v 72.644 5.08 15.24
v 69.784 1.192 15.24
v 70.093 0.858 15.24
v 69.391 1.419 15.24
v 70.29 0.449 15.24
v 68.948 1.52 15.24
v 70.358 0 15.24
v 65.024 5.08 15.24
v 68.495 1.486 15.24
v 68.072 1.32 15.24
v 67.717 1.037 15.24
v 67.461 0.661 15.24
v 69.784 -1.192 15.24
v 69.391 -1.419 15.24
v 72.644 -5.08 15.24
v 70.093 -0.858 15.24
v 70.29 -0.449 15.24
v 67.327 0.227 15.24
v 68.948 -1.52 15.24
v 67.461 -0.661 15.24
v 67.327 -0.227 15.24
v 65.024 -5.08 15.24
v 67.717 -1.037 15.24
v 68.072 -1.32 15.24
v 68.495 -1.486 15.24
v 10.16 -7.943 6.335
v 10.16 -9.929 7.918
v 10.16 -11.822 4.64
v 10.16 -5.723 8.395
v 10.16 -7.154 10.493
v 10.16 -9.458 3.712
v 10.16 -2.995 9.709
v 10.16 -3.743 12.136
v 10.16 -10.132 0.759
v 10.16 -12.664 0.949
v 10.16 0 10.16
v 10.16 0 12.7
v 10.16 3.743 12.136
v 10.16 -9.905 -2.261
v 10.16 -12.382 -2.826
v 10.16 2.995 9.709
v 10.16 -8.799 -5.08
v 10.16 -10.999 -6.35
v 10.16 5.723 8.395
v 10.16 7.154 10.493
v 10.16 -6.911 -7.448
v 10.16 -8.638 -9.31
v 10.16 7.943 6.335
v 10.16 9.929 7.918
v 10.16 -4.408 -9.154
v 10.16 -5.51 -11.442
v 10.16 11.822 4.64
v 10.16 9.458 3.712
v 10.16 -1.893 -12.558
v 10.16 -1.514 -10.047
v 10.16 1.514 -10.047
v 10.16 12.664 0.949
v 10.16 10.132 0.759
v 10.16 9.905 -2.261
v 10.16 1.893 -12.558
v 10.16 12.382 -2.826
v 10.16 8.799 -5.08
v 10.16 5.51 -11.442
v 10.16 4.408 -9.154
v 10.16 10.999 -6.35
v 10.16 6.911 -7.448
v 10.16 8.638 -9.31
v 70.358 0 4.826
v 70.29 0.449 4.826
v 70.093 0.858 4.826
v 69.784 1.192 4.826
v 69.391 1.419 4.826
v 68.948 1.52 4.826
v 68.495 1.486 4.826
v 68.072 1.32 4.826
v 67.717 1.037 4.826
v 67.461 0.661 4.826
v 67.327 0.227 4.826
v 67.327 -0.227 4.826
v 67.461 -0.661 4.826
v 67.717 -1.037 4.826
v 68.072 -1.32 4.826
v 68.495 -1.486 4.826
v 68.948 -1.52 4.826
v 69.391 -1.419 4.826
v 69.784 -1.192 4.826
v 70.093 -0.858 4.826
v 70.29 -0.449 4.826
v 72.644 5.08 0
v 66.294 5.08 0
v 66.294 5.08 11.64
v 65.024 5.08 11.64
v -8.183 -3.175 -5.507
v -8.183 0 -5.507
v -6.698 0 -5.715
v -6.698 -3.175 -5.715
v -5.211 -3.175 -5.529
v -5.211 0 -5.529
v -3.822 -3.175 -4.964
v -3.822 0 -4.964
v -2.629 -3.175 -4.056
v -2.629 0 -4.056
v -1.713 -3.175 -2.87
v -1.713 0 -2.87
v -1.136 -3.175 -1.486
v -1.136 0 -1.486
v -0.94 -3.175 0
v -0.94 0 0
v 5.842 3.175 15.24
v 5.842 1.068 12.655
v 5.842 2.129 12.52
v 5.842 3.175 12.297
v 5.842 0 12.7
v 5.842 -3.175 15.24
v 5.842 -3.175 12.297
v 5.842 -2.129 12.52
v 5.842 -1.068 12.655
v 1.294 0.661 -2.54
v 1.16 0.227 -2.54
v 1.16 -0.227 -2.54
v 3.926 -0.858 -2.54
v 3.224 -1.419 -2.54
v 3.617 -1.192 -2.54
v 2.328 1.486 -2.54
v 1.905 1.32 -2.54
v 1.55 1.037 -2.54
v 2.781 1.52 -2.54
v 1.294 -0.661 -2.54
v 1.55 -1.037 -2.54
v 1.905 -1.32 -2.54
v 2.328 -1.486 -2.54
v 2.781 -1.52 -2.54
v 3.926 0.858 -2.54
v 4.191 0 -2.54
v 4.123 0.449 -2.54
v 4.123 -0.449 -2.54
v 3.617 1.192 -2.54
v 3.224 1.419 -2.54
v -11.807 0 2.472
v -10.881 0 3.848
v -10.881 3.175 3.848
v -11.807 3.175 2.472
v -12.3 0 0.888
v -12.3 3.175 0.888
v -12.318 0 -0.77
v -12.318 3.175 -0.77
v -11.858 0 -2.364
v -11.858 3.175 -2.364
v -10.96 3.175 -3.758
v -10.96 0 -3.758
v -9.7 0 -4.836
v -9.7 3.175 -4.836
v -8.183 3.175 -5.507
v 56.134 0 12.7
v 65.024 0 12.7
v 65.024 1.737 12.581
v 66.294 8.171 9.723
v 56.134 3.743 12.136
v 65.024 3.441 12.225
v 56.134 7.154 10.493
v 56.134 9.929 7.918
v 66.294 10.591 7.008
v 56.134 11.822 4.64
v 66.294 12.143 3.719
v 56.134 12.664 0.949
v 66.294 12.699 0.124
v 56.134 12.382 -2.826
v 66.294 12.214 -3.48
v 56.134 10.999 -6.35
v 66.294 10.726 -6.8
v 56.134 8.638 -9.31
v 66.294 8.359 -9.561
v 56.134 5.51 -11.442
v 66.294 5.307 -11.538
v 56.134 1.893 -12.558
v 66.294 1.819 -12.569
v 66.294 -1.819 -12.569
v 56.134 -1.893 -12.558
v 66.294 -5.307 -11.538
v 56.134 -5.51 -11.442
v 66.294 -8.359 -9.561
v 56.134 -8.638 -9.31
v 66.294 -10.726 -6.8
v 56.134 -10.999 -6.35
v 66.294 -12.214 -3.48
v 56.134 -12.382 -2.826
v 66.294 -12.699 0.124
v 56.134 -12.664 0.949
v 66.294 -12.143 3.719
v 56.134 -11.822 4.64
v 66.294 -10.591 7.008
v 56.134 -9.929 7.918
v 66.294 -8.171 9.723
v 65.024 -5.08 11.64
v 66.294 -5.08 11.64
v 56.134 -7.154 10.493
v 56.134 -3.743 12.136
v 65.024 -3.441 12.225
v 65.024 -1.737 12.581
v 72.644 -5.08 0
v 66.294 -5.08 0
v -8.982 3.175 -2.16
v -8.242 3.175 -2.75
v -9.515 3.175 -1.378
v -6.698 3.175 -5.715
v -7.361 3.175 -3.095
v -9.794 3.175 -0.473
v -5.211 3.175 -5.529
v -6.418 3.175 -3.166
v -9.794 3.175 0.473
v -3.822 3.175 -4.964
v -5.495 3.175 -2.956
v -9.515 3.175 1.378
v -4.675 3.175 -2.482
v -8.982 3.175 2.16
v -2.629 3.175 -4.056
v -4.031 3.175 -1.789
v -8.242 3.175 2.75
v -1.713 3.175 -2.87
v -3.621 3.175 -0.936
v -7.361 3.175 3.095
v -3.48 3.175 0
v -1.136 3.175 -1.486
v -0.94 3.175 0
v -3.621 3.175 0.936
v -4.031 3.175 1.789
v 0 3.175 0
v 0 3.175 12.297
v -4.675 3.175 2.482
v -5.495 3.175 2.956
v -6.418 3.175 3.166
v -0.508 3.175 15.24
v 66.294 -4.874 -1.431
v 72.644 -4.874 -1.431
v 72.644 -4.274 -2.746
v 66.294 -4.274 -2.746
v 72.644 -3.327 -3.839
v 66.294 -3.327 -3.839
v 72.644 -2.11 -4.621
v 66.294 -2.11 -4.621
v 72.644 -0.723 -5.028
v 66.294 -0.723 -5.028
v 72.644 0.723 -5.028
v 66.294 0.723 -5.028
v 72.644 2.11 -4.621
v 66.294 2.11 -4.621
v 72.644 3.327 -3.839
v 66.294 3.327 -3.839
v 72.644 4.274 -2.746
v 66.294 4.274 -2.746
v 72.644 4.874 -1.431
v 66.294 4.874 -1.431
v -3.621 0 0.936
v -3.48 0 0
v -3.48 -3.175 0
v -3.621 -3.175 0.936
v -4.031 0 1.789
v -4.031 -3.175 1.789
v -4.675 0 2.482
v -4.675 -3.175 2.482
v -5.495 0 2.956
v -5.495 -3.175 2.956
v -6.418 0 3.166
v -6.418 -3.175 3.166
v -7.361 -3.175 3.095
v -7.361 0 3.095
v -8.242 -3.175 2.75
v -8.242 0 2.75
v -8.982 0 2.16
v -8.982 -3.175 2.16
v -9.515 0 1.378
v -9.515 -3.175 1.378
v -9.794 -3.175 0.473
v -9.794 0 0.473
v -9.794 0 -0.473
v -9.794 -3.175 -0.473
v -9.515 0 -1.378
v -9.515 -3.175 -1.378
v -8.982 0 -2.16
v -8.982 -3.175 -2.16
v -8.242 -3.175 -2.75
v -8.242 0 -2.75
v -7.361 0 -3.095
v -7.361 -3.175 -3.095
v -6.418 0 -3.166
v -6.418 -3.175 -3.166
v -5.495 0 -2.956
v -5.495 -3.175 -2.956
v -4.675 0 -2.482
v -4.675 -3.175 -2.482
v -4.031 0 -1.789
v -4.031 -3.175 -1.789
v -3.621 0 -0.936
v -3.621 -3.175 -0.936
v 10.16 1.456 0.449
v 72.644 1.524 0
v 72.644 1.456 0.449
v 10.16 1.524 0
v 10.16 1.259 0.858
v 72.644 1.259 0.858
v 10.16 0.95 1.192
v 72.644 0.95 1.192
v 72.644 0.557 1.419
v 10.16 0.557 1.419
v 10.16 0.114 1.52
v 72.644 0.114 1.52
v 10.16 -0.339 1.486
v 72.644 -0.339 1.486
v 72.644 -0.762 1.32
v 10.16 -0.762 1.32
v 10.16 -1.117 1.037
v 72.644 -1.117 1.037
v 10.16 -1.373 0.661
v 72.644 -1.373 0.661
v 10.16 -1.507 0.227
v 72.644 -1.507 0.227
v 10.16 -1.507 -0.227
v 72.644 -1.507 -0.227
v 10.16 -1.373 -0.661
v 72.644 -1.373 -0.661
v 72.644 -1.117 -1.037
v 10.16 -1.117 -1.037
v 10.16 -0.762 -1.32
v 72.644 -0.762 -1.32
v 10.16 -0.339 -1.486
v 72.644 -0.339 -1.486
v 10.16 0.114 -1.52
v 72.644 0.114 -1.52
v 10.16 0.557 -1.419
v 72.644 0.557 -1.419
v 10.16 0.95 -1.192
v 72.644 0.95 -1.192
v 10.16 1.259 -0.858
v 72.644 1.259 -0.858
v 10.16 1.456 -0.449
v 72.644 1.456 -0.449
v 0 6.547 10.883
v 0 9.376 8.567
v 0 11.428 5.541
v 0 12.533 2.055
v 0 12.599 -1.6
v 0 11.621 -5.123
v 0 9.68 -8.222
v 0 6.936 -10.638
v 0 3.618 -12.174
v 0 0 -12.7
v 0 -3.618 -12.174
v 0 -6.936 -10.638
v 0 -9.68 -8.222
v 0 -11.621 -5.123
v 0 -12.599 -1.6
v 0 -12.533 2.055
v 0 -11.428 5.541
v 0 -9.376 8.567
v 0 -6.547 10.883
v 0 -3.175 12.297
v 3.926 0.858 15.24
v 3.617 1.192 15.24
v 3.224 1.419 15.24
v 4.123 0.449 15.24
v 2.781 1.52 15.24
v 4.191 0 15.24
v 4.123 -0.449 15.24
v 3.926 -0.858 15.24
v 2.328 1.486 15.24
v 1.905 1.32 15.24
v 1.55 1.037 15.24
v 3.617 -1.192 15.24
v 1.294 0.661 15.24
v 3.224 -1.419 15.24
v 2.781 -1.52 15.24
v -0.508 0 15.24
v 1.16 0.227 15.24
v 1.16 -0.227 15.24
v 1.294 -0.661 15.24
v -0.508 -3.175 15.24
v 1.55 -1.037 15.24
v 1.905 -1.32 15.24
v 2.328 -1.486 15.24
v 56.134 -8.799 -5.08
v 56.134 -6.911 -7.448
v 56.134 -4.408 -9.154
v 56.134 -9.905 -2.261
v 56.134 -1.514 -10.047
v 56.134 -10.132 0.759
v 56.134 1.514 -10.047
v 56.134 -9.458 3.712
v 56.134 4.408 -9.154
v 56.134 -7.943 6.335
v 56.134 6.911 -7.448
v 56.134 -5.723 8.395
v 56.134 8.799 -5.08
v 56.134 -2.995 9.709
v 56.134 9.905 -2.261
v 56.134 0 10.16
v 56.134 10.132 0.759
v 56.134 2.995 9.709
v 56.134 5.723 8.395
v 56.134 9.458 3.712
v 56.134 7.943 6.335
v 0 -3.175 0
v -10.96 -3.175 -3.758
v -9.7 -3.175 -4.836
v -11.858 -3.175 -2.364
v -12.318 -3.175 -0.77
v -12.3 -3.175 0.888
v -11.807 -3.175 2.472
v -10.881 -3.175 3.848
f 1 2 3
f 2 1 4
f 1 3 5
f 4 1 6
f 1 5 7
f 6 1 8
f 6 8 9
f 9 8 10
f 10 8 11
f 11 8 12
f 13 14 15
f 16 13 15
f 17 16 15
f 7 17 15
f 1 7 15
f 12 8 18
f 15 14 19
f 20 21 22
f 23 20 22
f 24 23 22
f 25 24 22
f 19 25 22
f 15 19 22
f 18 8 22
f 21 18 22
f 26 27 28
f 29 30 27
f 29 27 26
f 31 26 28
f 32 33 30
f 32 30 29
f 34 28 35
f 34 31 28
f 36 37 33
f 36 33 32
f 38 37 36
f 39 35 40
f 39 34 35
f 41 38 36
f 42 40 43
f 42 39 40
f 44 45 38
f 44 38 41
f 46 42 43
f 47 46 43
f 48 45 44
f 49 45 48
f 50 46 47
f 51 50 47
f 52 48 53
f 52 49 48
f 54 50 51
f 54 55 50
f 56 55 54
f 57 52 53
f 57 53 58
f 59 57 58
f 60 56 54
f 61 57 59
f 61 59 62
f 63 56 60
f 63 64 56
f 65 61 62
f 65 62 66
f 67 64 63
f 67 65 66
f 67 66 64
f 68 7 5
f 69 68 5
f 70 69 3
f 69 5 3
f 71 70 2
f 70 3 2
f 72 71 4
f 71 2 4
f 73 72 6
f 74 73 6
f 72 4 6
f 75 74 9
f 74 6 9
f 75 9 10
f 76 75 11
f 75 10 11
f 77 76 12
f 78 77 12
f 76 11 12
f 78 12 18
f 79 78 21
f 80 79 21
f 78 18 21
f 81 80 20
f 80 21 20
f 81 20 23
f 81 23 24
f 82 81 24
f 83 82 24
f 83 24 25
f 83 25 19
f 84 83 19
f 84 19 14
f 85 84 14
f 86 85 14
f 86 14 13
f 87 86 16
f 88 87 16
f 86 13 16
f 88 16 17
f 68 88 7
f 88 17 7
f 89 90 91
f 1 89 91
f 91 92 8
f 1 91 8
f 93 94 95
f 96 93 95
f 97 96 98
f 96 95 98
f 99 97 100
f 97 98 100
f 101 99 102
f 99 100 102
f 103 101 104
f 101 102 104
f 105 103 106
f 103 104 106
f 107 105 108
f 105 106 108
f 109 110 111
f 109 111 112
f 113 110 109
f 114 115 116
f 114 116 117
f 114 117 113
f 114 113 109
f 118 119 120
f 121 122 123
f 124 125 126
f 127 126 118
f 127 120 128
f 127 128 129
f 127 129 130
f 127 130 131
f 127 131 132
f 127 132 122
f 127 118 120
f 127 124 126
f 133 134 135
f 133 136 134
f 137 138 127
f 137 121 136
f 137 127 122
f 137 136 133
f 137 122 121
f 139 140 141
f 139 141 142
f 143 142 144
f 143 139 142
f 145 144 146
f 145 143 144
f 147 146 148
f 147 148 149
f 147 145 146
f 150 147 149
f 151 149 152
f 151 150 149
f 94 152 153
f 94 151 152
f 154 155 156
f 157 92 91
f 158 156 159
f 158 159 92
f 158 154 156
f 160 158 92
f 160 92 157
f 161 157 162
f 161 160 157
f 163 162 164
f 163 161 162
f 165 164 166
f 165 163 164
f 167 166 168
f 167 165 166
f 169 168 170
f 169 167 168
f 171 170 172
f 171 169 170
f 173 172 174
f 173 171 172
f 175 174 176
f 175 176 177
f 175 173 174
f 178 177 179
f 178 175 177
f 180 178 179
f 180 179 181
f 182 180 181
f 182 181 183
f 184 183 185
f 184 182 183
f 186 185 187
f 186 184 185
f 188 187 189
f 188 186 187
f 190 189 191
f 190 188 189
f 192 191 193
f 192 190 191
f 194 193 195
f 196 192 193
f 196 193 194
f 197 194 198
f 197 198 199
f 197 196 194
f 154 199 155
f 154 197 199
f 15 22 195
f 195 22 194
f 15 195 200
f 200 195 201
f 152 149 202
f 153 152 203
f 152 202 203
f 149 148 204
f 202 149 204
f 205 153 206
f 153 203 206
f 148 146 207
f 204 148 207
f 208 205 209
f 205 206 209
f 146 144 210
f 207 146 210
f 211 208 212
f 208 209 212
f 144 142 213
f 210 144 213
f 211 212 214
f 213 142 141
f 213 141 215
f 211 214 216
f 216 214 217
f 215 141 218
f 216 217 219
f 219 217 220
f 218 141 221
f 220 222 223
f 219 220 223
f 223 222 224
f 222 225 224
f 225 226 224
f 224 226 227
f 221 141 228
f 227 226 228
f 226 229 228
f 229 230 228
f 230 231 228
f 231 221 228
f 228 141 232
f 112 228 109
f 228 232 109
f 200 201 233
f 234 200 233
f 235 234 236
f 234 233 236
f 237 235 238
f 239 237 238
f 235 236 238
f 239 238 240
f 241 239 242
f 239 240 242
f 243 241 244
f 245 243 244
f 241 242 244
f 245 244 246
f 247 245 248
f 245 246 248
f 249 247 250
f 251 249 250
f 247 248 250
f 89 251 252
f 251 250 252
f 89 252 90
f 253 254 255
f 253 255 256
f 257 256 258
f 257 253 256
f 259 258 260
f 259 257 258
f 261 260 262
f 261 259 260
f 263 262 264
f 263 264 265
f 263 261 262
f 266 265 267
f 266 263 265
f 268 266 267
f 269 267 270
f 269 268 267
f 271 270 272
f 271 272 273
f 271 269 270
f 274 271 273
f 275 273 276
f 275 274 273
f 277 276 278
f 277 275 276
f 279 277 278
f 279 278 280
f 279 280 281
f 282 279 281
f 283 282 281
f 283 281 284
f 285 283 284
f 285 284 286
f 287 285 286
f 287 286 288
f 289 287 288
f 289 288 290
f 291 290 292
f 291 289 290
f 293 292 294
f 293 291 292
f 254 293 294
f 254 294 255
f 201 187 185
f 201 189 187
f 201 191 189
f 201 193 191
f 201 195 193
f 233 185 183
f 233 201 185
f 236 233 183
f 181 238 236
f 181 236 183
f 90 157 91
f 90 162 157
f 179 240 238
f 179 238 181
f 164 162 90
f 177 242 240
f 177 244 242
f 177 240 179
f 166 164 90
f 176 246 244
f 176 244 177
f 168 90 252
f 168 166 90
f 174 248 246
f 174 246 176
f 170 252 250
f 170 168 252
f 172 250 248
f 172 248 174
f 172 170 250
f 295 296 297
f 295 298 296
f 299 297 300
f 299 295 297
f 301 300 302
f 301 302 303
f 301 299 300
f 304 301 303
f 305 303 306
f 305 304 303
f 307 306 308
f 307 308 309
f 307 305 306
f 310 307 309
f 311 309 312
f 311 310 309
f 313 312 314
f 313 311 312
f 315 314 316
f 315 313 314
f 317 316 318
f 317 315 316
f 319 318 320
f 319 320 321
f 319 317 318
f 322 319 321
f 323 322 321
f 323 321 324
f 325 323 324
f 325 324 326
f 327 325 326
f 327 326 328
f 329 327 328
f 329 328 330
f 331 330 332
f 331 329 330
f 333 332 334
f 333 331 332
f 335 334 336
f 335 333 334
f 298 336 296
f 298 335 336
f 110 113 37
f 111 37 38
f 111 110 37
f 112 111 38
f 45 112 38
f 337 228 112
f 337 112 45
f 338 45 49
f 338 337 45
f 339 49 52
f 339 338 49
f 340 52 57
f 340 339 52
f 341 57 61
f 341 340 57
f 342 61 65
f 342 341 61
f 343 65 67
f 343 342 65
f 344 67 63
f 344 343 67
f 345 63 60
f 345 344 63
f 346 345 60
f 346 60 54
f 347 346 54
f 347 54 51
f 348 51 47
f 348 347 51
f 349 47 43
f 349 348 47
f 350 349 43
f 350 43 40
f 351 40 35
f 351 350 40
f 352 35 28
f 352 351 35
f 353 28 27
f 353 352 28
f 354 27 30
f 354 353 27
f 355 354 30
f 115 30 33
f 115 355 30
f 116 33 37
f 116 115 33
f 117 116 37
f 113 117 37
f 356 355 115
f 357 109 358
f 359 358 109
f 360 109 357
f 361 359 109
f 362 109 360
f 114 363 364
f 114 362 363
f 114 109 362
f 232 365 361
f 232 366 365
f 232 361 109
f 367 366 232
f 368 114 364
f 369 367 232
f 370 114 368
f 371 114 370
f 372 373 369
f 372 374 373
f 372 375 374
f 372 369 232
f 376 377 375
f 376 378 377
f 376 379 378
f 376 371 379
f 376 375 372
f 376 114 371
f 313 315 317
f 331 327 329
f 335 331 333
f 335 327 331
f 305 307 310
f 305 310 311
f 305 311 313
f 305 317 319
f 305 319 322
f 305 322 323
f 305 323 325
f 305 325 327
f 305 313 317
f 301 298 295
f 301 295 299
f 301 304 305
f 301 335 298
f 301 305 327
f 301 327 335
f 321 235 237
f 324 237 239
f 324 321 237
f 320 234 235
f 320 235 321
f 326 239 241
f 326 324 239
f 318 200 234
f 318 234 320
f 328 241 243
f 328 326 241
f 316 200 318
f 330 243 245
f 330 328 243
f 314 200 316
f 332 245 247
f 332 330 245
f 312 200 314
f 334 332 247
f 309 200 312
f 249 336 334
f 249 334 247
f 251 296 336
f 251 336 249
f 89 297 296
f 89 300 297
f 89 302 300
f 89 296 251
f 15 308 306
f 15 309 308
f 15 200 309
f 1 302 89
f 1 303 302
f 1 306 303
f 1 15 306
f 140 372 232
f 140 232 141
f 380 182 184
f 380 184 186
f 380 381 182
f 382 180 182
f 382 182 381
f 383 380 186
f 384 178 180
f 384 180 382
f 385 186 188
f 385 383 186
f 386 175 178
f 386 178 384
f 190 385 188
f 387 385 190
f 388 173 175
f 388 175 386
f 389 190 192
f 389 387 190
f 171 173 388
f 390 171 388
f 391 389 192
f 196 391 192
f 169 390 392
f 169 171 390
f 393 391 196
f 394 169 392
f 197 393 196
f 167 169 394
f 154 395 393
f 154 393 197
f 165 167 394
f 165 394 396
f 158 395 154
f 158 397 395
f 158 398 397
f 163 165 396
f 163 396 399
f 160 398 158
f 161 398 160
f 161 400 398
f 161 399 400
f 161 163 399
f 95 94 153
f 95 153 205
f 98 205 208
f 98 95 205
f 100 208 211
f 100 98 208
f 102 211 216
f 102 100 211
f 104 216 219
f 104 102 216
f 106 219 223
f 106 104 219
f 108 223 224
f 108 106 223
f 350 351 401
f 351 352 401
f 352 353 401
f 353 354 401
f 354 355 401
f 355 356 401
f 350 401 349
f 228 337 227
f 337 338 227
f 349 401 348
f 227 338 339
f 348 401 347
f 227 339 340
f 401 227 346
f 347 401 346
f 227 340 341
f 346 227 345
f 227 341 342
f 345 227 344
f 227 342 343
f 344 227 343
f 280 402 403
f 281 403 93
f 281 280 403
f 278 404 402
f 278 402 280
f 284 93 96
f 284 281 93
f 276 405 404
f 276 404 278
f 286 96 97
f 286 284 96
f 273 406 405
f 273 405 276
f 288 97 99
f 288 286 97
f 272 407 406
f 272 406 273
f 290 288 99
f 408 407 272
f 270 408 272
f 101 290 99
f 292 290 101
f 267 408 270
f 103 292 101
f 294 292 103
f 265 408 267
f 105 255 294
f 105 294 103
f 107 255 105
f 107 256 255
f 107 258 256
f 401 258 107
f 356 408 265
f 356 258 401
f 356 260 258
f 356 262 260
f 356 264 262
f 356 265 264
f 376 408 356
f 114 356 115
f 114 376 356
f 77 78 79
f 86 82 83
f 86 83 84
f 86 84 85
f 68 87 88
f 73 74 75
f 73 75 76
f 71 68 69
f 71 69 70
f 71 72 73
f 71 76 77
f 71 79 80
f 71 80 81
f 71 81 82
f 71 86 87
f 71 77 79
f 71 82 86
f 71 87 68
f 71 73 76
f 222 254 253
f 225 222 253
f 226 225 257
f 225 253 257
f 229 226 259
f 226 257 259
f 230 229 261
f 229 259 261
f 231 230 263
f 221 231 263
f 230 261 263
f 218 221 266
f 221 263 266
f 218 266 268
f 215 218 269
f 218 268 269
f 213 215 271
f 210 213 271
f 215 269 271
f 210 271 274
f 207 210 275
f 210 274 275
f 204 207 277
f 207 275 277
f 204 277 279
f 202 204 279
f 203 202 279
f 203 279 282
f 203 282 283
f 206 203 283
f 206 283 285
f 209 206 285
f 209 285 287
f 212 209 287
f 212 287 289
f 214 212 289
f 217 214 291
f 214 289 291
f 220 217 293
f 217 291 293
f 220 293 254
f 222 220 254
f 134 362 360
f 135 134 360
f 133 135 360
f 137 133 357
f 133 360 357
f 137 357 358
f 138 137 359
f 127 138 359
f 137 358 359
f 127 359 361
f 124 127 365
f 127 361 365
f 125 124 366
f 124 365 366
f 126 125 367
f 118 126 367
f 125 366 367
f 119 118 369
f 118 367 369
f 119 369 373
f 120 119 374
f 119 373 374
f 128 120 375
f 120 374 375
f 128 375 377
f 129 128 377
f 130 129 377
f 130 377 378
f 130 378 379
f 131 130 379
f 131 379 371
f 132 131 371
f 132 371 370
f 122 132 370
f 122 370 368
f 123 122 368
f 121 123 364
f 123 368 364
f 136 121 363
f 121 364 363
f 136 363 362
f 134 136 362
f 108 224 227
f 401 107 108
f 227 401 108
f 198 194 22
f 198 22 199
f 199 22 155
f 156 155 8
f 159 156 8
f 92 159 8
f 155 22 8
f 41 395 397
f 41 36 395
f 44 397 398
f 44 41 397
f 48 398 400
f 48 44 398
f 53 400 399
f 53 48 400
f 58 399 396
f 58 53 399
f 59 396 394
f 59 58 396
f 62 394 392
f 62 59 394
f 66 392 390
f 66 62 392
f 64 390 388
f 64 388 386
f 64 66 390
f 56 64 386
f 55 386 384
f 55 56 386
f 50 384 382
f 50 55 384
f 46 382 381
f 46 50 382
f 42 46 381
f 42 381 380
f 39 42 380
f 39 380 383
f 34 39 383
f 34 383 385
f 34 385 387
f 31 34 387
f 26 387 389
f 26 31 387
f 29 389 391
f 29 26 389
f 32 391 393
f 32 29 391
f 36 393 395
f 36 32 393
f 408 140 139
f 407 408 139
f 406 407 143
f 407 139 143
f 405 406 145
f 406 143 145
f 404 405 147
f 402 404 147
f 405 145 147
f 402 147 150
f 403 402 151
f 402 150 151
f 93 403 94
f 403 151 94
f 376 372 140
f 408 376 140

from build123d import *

# Parameters (mm, degrees)
F0_W          = 5.842
F0_H          = 12.7
F0_R          = 3.175
F2_DEPTH      = 3.175
F3_R          = 1.524
F4_DEPTH      = 1.27
F4_DEPTH_BACK = 6.35
F5_DEPTH      = 56.134
F6_R          = 1.524
F7_DEPTH      = 17.78
F8_DEPTH      = 10.414


with BuildPart() as f1:
    # F0 (on Front) → F1 (revolve)
    with BuildSketch(Plane.XZ):
        Polygon((5.842, 12.7), (5.842, 0), (66.294, 0), (66.294, 12.7), (56.134, 12.7), (56.134, 10.16), (10.16, 10.16), (10.16, 12.7), align=None)
        with Locations((2.921, 6.35)):
            Rectangle(F0_W, F0_H)
    revolve(axis=Axis((33.147, 0, 0), (-1, 0, 0)))

    # F0 (on Front) → F2 (join, symmetric)
    with BuildSketch(Plane.XZ):
        with BuildLine():
            Line((-0.9398, 0), (0, 0))
            Line((0, 0), (0, 12.7))
            Line((0, 12.7), (5.842, 12.7))
            Line((5.842, 12.7), (5.842, 15.24))
            Line((5.842, 15.24), (-0.508, 15.24))
            Line((-0.508, 15.24), (-10.8806298187, 3.8475430269))
            ThreePointArc((-10.8806298187, 3.8475430269), (-4.5919612295, 5.3297205562), (-0.9398, 0))
        make_face()
        with BuildLine():
            ThreePointArc((-8.1826630726, -5.5069827884), (-3.1957909266, -4.5493385486), (-0.9398, 0))
            ThreePointArc((-0.9398, 0), (-4.5919612295, 5.3297205562), (-10.8806298187, 3.8475430269))
            ThreePointArc((-10.8806298187, 3.8475430269), (-12.1459778134, -1.5837270034), (-8.1826630726, -5.5069827884))
        make_face()
        with Locations((-6.6548, 0)):
            Circle(F0_R, mode=Mode.SUBTRACT)
        with Locations((2.921, 6.35)):
            Rectangle(F0_W, F0_H)
    extrude(amount=F2_DEPTH, both=True)

    # F3 (on face) → F4 (join, two sides)
    with BuildSketch(Plane.YZ.offset(66.294)) as f4_sk:
        with BuildLine():
            ThreePointArc((-5.08, 0), (0, -5.08), (5.08, 0))
            ThreePointArc((5.08, 0), (0, 5.08), (-5.08, 0))
        make_face()
        Circle(F3_R, mode=Mode.SUBTRACT)
        with BuildLine():
            ThreePointArc((-5.08, 0), (0, 5.08), (5.08, 0))
            Line((5.08, 0), (5.08, 15.24))
            Line((5.08, 15.24), (-5.08, 15.24))
            Line((-5.08, 15.24), (-5.08, 0))
        make_face()
    extrude(amount=-F4_DEPTH)
    extrude(f4_sk.sketch, amount=F4_DEPTH_BACK)

    # F3 (on face) → F5 (cut, through all)
    with BuildSketch(Plane.YZ.offset(66.294)):
        Circle(F3_R)
    extrude(amount=-F5_DEPTH, mode=Mode.SUBTRACT)

    # F6 (on face) → F7 (cut)
    with BuildSketch(Plane.XY.offset(15.24)):
        with Locations((2.667, 0)):
            Circle(F6_R)
    extrude(amount=-F7_DEPTH, mode=Mode.SUBTRACT)

    # F6 (on face) → F8 (cut)
    with BuildSketch(Plane.XY.offset(15.24)):
        with Locations((68.834, 0)):
            Circle(F6_R)
    extrude(amount=-F8_DEPTH, mode=Mode.SUBTRACT)


solid = f1.part
